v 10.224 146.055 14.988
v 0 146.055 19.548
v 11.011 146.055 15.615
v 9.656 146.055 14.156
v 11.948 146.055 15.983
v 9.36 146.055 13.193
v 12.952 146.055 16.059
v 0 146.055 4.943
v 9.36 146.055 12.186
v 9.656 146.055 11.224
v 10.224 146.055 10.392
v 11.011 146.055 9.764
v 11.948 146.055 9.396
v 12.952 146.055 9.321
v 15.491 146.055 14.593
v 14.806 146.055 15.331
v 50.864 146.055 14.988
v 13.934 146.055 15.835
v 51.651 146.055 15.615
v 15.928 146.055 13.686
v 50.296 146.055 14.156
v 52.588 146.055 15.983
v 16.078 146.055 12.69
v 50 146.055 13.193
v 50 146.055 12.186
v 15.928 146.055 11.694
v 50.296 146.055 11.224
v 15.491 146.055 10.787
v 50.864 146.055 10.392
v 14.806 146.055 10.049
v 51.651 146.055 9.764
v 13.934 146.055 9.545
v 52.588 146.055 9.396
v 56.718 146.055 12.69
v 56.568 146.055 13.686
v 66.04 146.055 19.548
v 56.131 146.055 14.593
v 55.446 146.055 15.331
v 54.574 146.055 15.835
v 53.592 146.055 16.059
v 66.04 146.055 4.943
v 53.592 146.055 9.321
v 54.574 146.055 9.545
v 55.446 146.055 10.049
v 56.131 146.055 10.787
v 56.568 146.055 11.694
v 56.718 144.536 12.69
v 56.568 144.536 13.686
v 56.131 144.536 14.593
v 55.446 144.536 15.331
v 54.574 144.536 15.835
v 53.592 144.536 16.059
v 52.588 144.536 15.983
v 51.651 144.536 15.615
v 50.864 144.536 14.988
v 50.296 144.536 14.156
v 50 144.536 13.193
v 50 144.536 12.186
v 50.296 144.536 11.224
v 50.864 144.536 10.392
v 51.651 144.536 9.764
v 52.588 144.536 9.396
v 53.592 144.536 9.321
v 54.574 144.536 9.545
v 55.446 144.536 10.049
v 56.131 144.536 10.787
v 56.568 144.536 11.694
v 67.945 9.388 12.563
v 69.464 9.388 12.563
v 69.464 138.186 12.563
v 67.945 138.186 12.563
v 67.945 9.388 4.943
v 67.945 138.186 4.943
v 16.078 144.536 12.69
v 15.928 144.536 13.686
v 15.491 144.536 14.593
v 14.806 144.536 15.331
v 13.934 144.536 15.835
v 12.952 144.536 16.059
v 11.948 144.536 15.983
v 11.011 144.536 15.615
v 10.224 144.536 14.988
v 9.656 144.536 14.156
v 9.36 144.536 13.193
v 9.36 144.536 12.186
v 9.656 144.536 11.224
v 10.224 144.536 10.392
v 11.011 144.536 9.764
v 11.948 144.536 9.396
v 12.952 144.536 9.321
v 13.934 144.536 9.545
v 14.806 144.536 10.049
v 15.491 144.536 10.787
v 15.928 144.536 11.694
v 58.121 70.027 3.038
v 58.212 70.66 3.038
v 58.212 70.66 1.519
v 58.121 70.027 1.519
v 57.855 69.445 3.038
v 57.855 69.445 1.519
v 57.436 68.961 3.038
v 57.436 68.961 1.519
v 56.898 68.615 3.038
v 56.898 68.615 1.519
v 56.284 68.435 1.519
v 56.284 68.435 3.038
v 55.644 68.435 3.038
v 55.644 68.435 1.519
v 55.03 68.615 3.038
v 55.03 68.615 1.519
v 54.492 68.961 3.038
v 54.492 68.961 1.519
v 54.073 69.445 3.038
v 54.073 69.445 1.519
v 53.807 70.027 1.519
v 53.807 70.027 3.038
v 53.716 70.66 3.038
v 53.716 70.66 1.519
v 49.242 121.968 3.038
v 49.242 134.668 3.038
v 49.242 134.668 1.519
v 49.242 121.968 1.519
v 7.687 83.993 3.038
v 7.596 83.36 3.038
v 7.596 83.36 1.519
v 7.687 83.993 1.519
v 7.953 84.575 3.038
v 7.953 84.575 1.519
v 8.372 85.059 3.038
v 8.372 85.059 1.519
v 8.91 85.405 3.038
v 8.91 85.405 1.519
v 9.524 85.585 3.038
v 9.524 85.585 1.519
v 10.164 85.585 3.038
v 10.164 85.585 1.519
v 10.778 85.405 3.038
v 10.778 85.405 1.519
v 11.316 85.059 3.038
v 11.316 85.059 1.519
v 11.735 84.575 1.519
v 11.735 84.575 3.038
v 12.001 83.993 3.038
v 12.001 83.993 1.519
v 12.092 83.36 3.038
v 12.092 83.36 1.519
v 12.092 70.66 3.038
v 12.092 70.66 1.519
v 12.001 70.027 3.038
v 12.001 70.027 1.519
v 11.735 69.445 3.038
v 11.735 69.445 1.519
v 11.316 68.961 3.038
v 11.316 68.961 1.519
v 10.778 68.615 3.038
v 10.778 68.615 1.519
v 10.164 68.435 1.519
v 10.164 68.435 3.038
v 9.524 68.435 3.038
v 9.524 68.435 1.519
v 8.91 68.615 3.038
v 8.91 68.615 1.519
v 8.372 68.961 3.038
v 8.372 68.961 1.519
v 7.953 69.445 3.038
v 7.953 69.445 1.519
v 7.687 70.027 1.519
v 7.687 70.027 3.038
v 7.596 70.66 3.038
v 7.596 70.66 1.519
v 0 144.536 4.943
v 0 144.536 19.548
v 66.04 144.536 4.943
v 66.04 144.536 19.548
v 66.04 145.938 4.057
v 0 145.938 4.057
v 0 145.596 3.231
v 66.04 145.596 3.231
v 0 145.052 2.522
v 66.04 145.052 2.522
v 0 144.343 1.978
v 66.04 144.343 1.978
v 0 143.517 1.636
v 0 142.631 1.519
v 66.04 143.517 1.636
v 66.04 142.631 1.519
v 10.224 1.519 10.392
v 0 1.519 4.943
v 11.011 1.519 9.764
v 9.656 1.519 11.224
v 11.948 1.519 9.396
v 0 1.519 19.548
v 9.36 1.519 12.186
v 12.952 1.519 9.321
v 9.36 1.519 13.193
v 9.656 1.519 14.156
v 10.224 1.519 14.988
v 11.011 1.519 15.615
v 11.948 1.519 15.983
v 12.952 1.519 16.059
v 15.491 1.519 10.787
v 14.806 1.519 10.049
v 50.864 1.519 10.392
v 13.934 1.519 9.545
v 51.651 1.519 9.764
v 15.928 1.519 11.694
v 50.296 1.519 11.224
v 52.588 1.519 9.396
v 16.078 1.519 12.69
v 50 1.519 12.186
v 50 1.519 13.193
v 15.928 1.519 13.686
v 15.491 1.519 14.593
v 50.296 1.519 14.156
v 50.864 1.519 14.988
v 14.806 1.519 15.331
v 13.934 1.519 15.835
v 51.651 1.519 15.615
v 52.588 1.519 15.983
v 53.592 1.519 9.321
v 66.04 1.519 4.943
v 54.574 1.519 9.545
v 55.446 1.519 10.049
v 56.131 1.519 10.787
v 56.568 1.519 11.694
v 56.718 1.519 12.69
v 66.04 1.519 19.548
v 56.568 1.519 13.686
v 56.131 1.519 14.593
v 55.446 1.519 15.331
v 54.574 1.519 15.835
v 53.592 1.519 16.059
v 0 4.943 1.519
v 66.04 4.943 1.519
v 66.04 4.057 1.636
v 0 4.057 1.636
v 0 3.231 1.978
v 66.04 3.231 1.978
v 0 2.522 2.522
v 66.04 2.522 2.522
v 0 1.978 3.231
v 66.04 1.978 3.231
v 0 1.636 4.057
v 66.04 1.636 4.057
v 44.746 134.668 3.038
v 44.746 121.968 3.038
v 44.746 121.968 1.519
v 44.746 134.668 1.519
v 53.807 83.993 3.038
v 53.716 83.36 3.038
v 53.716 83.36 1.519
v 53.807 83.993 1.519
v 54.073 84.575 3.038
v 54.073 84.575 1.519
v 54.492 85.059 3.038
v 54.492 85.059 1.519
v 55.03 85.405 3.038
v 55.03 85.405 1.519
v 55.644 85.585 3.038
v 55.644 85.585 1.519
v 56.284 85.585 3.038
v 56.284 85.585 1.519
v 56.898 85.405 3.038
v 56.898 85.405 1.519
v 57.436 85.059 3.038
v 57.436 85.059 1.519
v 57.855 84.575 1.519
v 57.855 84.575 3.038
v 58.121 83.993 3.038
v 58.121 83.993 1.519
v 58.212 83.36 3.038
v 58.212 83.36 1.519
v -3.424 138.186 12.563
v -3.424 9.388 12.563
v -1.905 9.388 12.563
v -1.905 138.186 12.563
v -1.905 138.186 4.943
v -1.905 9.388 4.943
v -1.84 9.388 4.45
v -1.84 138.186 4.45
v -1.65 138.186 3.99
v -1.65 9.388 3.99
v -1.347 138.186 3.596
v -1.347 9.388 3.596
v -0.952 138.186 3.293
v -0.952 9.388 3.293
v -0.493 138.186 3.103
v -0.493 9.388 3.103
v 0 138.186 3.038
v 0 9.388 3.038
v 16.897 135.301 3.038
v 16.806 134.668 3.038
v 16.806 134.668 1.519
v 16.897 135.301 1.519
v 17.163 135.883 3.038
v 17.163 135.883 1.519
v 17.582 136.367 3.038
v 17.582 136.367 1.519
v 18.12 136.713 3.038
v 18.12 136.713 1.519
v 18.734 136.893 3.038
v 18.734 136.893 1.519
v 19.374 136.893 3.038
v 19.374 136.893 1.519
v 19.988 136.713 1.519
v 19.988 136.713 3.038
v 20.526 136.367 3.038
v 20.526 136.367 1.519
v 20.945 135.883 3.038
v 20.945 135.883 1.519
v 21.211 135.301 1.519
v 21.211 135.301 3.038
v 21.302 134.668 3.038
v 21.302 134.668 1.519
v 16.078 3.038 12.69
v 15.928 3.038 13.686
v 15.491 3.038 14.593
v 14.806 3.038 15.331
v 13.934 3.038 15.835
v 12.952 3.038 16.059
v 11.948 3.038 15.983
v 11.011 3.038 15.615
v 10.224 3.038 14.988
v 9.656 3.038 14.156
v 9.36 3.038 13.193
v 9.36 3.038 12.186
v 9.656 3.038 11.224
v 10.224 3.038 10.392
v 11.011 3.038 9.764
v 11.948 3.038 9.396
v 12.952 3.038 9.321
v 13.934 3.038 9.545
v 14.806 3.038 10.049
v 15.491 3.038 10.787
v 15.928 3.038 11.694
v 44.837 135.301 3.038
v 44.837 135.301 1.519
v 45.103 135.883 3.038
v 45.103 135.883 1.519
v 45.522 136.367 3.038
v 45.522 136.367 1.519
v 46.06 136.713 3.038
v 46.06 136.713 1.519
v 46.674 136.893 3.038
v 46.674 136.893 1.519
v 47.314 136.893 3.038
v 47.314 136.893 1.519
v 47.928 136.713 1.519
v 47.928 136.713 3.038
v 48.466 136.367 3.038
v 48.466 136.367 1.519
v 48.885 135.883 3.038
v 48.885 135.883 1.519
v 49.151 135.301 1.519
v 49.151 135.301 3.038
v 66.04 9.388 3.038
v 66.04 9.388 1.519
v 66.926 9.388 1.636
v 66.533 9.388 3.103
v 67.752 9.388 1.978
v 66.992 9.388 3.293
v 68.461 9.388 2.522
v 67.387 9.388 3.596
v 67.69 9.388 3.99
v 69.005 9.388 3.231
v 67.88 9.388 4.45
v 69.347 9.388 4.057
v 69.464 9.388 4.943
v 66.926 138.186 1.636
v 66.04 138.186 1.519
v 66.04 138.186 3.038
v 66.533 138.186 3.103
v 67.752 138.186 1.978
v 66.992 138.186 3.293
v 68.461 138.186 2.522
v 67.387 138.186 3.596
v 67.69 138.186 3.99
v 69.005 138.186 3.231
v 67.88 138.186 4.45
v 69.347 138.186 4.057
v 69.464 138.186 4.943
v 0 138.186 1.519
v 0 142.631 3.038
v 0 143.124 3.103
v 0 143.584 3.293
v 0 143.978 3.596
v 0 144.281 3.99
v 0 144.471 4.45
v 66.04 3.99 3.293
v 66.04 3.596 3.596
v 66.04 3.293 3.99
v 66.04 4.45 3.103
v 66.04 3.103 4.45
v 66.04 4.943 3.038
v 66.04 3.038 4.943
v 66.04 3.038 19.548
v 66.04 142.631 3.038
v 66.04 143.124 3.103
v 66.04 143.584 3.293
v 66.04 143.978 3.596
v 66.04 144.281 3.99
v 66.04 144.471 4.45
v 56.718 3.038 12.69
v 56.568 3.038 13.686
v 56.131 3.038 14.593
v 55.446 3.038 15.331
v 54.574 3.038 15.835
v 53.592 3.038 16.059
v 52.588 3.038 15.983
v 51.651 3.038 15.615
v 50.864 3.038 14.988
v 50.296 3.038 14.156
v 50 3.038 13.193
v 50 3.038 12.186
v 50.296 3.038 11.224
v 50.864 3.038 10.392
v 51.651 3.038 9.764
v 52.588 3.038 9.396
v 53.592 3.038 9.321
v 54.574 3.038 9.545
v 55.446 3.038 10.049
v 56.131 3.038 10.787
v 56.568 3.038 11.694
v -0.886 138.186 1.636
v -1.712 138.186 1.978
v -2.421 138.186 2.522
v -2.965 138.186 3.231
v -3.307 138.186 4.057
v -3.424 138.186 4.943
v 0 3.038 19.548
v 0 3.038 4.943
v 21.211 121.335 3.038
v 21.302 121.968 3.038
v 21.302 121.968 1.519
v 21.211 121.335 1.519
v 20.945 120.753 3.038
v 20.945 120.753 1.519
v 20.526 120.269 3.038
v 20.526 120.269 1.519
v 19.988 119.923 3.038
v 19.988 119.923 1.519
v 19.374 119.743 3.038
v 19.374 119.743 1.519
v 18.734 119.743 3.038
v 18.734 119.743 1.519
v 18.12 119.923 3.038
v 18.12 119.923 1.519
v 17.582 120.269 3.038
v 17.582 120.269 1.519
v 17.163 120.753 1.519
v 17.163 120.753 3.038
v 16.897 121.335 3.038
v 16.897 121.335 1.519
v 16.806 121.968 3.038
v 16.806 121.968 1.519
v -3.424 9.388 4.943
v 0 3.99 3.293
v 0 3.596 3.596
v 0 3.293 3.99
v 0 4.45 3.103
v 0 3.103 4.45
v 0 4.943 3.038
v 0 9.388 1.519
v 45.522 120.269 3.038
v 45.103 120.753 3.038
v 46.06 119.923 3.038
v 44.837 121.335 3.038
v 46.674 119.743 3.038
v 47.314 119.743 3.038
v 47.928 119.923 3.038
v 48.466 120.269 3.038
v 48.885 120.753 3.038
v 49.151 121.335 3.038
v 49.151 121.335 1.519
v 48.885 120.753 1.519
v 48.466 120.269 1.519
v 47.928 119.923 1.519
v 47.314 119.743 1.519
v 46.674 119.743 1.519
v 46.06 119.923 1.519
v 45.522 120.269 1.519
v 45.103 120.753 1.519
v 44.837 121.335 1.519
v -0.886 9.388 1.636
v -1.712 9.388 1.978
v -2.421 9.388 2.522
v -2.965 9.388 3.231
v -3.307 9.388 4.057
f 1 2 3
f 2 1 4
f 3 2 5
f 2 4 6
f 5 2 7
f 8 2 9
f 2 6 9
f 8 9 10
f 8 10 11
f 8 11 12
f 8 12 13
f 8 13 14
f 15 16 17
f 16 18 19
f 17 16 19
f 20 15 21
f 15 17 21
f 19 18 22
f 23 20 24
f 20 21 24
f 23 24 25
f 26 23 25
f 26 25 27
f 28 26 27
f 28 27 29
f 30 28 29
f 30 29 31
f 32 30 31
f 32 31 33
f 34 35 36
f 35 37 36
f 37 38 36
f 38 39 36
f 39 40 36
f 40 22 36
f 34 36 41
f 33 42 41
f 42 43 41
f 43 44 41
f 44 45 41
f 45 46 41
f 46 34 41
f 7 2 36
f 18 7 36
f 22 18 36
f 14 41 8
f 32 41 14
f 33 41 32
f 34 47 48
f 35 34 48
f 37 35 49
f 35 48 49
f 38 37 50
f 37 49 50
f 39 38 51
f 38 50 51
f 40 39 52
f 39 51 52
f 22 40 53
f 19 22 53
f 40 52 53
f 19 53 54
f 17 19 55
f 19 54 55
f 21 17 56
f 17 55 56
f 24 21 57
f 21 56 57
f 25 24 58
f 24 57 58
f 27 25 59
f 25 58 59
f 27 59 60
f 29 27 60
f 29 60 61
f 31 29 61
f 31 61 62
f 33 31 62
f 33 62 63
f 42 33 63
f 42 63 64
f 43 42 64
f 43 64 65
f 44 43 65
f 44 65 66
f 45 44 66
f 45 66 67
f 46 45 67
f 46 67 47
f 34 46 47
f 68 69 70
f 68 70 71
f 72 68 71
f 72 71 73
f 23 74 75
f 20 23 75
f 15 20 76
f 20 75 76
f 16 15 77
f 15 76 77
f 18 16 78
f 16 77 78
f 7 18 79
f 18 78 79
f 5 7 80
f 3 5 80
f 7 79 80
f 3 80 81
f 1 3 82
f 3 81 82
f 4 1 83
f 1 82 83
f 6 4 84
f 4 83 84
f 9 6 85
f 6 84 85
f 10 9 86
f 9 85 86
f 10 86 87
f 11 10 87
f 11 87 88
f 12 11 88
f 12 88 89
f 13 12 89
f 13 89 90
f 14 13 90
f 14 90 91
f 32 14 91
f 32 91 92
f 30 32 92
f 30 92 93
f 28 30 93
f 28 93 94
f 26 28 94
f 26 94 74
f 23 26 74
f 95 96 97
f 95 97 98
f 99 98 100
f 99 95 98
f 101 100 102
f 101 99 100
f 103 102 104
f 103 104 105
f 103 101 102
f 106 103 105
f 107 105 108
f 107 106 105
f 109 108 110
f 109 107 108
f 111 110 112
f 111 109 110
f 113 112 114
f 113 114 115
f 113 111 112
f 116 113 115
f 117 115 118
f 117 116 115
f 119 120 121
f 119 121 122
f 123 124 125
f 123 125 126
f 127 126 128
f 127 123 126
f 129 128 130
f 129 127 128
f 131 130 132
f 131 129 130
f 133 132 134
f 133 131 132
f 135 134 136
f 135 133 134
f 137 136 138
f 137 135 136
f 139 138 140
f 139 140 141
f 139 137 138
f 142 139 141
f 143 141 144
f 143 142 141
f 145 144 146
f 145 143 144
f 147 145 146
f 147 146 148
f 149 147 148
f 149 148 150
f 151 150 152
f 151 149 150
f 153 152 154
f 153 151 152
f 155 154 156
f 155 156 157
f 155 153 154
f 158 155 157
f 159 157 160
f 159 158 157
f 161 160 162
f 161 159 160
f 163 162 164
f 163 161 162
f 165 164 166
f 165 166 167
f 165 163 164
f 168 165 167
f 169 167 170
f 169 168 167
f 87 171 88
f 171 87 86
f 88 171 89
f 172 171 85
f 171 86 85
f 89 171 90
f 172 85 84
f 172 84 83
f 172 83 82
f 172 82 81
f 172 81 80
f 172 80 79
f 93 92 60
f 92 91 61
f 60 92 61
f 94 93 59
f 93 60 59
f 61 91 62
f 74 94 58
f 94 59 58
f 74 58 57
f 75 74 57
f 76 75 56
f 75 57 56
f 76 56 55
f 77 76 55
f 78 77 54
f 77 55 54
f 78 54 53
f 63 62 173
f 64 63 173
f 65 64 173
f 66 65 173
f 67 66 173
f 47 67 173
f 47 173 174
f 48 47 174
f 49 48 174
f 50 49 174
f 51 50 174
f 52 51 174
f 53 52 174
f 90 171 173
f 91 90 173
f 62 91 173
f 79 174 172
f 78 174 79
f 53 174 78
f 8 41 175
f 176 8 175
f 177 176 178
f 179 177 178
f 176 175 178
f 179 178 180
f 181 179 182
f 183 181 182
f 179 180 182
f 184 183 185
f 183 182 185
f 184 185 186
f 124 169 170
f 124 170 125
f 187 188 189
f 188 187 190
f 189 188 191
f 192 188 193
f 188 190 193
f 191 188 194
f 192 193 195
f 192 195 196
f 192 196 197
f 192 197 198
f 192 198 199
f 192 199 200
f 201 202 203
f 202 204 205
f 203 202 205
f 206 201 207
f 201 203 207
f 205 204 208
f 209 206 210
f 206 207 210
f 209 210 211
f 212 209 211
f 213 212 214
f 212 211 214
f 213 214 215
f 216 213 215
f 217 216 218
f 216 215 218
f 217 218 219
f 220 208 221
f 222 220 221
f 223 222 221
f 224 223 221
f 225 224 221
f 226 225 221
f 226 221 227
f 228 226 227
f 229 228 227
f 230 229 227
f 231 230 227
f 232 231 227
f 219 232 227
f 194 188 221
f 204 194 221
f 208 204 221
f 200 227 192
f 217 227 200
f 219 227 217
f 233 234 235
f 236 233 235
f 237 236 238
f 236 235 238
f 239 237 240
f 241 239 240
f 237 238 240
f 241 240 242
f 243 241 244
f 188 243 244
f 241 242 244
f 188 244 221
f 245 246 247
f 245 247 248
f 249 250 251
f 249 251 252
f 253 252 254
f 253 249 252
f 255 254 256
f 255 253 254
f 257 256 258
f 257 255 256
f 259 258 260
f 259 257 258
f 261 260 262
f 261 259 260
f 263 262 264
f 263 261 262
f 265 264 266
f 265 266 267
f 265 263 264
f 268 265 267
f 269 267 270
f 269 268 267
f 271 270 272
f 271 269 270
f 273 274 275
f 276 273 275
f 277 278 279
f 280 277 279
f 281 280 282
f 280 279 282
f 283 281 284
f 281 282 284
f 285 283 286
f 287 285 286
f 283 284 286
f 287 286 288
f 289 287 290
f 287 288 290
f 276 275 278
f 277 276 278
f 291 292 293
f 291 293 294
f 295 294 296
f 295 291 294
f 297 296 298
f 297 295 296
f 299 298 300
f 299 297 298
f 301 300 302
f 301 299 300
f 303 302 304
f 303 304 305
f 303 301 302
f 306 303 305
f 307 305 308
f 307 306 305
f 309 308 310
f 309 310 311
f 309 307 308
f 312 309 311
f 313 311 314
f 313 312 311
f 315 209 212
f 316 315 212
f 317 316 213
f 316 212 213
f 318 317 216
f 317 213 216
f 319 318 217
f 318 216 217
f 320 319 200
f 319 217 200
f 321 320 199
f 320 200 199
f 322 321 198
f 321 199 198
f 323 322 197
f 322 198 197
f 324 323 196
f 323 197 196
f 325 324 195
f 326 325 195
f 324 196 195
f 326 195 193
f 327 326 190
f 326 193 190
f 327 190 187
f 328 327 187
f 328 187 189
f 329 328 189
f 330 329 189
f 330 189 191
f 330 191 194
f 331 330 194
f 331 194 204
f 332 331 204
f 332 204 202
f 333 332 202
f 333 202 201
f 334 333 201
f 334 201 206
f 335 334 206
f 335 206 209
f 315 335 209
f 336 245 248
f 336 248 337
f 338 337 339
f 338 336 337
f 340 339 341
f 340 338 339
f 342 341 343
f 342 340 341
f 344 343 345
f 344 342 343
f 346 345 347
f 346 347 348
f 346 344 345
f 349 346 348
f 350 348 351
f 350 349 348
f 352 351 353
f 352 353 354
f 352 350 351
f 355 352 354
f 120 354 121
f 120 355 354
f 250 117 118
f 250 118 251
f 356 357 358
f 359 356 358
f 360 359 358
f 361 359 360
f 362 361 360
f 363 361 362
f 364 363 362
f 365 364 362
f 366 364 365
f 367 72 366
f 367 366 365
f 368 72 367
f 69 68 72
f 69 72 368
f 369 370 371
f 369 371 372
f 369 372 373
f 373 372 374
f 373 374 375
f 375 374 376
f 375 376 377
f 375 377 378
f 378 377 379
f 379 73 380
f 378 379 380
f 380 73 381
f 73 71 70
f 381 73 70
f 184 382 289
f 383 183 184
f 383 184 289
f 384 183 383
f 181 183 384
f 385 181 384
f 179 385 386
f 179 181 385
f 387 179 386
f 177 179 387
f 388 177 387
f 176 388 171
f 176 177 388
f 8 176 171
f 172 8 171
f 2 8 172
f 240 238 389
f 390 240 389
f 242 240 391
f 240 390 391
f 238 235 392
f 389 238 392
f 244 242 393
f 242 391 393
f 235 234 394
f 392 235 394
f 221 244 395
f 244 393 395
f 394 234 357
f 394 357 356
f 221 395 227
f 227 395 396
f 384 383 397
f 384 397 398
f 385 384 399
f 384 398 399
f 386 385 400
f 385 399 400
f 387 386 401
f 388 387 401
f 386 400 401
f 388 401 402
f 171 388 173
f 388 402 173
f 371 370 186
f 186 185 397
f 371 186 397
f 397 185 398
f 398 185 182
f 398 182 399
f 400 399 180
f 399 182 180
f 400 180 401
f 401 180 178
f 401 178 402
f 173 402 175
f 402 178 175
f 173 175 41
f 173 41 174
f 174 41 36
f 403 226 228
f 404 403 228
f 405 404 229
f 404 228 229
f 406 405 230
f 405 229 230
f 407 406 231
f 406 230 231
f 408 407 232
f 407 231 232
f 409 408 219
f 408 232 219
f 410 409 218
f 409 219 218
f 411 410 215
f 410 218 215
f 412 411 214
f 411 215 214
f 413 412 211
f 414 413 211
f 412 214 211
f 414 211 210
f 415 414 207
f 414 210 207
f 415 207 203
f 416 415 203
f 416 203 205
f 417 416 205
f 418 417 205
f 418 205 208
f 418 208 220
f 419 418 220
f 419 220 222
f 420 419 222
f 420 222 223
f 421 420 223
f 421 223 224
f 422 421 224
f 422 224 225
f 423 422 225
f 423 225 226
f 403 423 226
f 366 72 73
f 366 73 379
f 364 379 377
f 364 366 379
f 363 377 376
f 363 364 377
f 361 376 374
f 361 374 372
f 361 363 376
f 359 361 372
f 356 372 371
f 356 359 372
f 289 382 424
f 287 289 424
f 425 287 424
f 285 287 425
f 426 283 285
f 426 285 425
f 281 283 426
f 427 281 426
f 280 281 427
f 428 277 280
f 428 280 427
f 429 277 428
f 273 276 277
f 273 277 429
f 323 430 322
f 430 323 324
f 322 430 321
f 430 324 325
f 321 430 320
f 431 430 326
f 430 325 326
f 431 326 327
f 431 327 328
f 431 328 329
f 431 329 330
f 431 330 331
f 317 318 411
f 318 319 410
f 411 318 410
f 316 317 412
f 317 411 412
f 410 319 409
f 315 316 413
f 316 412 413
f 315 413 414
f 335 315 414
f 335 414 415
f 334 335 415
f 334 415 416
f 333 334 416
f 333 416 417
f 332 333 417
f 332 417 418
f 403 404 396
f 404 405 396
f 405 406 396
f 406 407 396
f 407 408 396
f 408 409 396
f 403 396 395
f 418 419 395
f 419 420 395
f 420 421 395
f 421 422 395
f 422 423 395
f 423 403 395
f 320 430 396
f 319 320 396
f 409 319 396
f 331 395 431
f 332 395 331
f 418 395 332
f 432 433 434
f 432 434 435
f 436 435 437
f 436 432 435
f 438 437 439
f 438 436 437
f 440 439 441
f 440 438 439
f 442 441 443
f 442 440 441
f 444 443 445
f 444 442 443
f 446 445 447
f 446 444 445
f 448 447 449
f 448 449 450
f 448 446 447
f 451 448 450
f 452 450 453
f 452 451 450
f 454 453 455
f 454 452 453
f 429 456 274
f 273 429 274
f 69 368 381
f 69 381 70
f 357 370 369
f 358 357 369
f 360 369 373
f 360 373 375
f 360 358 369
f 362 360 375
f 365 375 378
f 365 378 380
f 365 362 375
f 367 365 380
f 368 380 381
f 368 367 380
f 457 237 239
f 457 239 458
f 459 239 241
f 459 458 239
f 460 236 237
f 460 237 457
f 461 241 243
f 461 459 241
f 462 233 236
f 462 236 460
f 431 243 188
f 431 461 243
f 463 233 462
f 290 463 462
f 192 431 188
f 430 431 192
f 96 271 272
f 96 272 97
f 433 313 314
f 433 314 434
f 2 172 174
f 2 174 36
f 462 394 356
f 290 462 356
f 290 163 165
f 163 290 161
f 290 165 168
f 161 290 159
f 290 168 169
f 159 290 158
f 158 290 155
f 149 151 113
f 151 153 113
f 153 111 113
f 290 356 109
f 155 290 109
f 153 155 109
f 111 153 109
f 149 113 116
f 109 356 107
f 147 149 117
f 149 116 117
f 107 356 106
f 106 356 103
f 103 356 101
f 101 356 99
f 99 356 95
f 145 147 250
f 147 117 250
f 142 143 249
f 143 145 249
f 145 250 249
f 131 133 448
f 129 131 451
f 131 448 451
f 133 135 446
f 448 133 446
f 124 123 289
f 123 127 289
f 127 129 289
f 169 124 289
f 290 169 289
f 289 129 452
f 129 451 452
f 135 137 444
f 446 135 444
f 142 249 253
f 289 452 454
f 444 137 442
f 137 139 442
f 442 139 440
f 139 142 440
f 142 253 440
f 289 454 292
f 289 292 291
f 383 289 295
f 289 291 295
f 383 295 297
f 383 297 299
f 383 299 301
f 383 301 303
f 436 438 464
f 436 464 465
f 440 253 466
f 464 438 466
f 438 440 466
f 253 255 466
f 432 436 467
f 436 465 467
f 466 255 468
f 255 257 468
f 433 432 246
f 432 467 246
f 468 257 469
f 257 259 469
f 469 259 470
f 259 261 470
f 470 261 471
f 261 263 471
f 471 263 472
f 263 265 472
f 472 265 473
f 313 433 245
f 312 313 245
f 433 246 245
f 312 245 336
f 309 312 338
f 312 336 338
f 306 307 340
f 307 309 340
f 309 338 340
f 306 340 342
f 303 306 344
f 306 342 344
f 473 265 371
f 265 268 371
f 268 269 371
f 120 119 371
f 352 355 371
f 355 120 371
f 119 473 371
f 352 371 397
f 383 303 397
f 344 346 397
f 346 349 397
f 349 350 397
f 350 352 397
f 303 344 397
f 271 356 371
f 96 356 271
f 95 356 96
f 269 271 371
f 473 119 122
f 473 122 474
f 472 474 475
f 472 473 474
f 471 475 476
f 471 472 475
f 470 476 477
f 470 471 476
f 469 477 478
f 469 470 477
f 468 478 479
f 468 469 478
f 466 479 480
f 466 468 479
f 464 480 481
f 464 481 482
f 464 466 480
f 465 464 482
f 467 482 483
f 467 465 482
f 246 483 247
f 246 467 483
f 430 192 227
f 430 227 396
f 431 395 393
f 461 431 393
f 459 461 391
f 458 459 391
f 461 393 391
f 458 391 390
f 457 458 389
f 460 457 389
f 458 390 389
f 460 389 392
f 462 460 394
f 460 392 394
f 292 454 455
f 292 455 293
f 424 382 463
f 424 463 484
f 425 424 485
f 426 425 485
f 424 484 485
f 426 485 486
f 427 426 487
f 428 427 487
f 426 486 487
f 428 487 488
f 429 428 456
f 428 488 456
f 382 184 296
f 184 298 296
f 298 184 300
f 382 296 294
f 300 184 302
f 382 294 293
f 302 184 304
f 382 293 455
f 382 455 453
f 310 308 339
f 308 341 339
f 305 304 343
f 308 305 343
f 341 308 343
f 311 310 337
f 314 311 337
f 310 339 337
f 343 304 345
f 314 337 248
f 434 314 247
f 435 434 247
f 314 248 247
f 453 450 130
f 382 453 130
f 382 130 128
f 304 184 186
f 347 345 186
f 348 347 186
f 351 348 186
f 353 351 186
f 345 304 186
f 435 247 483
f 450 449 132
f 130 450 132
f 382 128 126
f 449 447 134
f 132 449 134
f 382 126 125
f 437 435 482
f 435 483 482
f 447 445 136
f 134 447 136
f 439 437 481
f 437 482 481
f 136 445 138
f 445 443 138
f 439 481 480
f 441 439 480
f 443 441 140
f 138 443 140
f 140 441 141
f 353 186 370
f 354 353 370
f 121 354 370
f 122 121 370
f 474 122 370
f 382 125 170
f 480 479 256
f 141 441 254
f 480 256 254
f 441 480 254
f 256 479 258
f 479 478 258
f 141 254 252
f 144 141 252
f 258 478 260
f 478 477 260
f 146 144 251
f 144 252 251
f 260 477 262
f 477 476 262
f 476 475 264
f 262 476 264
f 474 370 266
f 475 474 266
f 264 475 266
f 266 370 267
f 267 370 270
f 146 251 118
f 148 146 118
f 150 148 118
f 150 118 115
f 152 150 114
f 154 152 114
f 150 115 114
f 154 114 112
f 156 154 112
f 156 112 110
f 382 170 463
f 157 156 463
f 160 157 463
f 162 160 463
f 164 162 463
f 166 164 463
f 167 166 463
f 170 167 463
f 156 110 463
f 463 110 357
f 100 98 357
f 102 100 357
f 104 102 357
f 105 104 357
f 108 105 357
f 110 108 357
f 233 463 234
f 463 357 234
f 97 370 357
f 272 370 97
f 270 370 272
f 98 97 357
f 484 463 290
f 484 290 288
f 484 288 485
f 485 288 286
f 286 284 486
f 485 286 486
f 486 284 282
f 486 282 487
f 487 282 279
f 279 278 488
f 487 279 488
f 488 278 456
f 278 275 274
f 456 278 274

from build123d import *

# Parameters (mm, degrees)
SKETCH1_W           = 66.04
SKETCH1_H           = 147.574
BOSS_EXTRUDE1_DEPTH = 3.03784
SKETCH3_W           = 66.04
SKETCH3_H           = 3.03784
BOSS_EXTRUDE2_DEPTH = 16.51
SKETCH4_R           = 3.3782
CUT_EXTRUDE1_DEPTH  = 163.854183627
SKETCH5_R           = 2.5527
CUT_EXTRUDE2_DEPTH  = 3.03784
BASE_FLANGE1_START  = -66.04
BASE_FLANGE1_DEPTH  = 66.04
SKETCH11_R          = 3.3782
CUT_EXTRUDE3_DEPTH  = 163.854183627
SKETCH12_R          = 2.2479
CUT_EXTRUDE4_DEPTH  = 163.517528827
CUT_EXTRUDE6_DEPTH  = 1.51892
EDGE_FLANGE1_DEPTH  = 128.79832


# Read off the part's stored shape, not the designer's step: Base-Flange1
# Sheet-metal steps are written as plain solids
with BuildPart() as part:
    # Sketch1 → Boss-Extrude1 (new body)
    with BuildSketch(Plane.XY):
        with Locations((33.02, 73.787)):
            Rectangle(SKETCH1_W, SKETCH1_H)
    extrude(amount=BOSS_EXTRUDE1_DEPTH)

    # Sketch3 → Boss-Extrude2 (add)
    with BuildSketch(Plane.XY.offset(3.03784)):
        with Locations((33.02, 146.05508)):
            Rectangle(SKETCH3_W, SKETCH3_H)
        with Locations((33.02, 1.51892)):
            Rectangle(SKETCH3_W, SKETCH3_H)
    extrude(amount=BOSS_EXTRUDE2_DEPTH)

    # Sketch4 → Cut-Extrude1 (cut, through all)
    with BuildSketch(Plane.XZ):
        with Locations(Location((12.7, 12.68984, 0), (0, 0, 270))):
            Circle(SKETCH4_R)
        with Locations(Location((53.34, 12.68984, 0), (0, 0, 270))):
            Circle(SKETCH4_R)
    extrude(amount=-CUT_EXTRUDE1_DEPTH, mode=Mode.SUBTRACT)

    # Sketch5 → Cut-Extrude2 (cut)
    with BuildSketch(Plane.XY.offset(3.03784)):
        with Locations((46.99, 126.449057869)):
            Circle(SKETCH5_R)
        with Locations((19.05, 126.449057869)):
            Circle(SKETCH5_R)
        with Locations((6.35, 75.141057869)):
            Circle(SKETCH5_R)
        with Locations((59.69, 75.141057869)):
            Circle(SKETCH5_R)
    extrude(amount=-CUT_EXTRUDE2_DEPTH, mode=Mode.SUBTRACT)


with BuildPart() as body_2:
    # Base-Flange1 outline → Base-Flange1 (new body)
    with BuildSketch(Plane.ZY.offset(BASE_FLANGE1_START)):
        with BuildLine():
            ThreePointArc((1.51892, 4.94284), (2.52176295, 2.52176295), (4.94284, 1.51892))
            Line((4.94284, 1.51892), (19.54784, 1.51892))
            Line((19.54784, 1.51892), (19.54784, 3.03784))
            Line((19.54784, 3.03784), (4.94284, 3.03784))
            ThreePointArc((4.94284, 3.03784), (3.595801582, 3.595801582), (3.03784, 4.94284))
            Line((3.03784, 4.94284), (3.03784, 142.63116))
            ThreePointArc((3.03784, 142.63116), (3.595801582, 143.978198418), (4.94284, 144.53616))
            Line((4.94284, 144.53616), (19.54784, 144.53616))
            Line((19.54784, 144.53616), (19.54784, 146.05508))
            Line((19.54784, 146.05508), (4.94284, 146.05508))
            ThreePointArc((4.94284, 146.05508), (2.52176295, 145.05223705), (1.51892, 142.63116))
            Line((1.51892, 142.63116), (1.51892, 4.94284))
        make_face()
    extrude(amount=BASE_FLANGE1_DEPTH)

    # Sketch11 → Cut-Extrude3 (cut, through all)
    with BuildSketch(Plane.XZ):
        with Locations((53.34, 12.68984)):
            Circle(SKETCH11_R)
        with Locations((12.7, 12.68984)):
            Circle(SKETCH11_R)
    extrude(amount=-CUT_EXTRUDE3_DEPTH, mode=Mode.SUBTRACT)

    # Sketch12 → Cut-Extrude4 (cut, through all)
    with BuildSketch(Plane.XY.offset(3.03784)):
        with Locations((55.9637, 77.009977807)):
            Circle(SKETCH12_R)
        with Locations((9.8441, 77.009977807)):
            Circle(SKETCH12_R)
        with Locations((46.993900058, 128.317977807)):
            Circle(SKETCH12_R)
        with Locations((19.053900058, 128.317977807)):
            Circle(SKETCH12_R)
    extrude(amount=-CUT_EXTRUDE4_DEPTH, mode=Mode.SUBTRACT)

    # Sketch14 → Cut-Extrude6 (cut)
    with BuildSketch(Plane.XY.offset(3.03784)):
        with BuildLine():
            Line((21.301800058, 134.667977807), (21.301800058, 121.967977807))
            ThreePointArc((21.301800058, 121.967977807), (19.053900058, 119.720077807), (16.806000058, 121.967977807))
            Line((16.806000058, 121.967977807), (16.806000058, 134.667977807))
            ThreePointArc((16.806000058, 134.667977807), (19.053900058, 136.915877807), (21.301800058, 134.667977807))
        make_face()
        with BuildLine():
            Line((53.7158, 70.659977807), (53.7158, 83.359977807))
            ThreePointArc((53.7158, 83.359977807), (55.9637, 85.607877807), (58.2116, 83.359977807))
            Line((58.2116, 83.359977807), (58.2116, 70.659977807))
            ThreePointArc((58.2116, 70.659977807), (55.9637, 68.412077807), (53.7158, 70.659977807))
        make_face()
        with BuildLine():
            Line((49.241800058, 134.667977807), (49.241800058, 121.967977807))
            ThreePointArc((49.241800058, 121.967977807), (46.993900058, 119.720077807), (44.746000058, 121.967977807))
            Line((44.746000058, 121.967977807), (44.746000058, 134.667977807))
            ThreePointArc((44.746000058, 134.667977807), (46.993900058, 136.915877807), (49.241800058, 134.667977807))
        make_face()
        with BuildLine():
            Line((12.092, 83.359977807), (12.092, 70.659977807))
            ThreePointArc((12.092, 70.659977807), (9.8441, 68.412077807), (7.5962, 70.659977807))
            Line((7.5962, 70.659977807), (7.5962, 83.359977807))
            ThreePointArc((7.5962, 83.359977807), (9.8441, 85.607877807), (12.092, 83.359977807))
        make_face()
    extrude(amount=-CUT_EXTRUDE6_DEPTH, mode=Mode.SUBTRACT)

    # Edge-Flange1 section (across the edge) → Edge-Flange1 (add)
    with BuildSketch(Plane(origin=(67.945, 9.38784, 3.03784), x_dir=(-1, 0, 0), z_dir=(0, 1, 0))):
        with BuildLine():
            Line((-1.51892, 1.905), (-1.51892, 9.525))
            Line((-1.51892, 9.525), (0, 9.525))
            Line((0, 9.525), (0, 1.905))
            ThreePointArc((0, 1.905), (0.557961582, 0.557961582), (1.905, 0))
            Line((1.905, 0), (1.905, -1.51892))
            ThreePointArc((1.905, -1.51892), (-0.51607705, -0.51607705), (-1.51892, 1.905))
        make_face()
    edge_flange1 = extrude(amount=EDGE_FLANGE1_DEPTH)

    # Mirror1: Edge-Flange1 across plane
    add(edge_flange1.mirror(Plane(origin=(33.02, 0, 0), x_dir=(0, 0, 1), z_dir=(1, 0, 0))))


solid = body_2.part
